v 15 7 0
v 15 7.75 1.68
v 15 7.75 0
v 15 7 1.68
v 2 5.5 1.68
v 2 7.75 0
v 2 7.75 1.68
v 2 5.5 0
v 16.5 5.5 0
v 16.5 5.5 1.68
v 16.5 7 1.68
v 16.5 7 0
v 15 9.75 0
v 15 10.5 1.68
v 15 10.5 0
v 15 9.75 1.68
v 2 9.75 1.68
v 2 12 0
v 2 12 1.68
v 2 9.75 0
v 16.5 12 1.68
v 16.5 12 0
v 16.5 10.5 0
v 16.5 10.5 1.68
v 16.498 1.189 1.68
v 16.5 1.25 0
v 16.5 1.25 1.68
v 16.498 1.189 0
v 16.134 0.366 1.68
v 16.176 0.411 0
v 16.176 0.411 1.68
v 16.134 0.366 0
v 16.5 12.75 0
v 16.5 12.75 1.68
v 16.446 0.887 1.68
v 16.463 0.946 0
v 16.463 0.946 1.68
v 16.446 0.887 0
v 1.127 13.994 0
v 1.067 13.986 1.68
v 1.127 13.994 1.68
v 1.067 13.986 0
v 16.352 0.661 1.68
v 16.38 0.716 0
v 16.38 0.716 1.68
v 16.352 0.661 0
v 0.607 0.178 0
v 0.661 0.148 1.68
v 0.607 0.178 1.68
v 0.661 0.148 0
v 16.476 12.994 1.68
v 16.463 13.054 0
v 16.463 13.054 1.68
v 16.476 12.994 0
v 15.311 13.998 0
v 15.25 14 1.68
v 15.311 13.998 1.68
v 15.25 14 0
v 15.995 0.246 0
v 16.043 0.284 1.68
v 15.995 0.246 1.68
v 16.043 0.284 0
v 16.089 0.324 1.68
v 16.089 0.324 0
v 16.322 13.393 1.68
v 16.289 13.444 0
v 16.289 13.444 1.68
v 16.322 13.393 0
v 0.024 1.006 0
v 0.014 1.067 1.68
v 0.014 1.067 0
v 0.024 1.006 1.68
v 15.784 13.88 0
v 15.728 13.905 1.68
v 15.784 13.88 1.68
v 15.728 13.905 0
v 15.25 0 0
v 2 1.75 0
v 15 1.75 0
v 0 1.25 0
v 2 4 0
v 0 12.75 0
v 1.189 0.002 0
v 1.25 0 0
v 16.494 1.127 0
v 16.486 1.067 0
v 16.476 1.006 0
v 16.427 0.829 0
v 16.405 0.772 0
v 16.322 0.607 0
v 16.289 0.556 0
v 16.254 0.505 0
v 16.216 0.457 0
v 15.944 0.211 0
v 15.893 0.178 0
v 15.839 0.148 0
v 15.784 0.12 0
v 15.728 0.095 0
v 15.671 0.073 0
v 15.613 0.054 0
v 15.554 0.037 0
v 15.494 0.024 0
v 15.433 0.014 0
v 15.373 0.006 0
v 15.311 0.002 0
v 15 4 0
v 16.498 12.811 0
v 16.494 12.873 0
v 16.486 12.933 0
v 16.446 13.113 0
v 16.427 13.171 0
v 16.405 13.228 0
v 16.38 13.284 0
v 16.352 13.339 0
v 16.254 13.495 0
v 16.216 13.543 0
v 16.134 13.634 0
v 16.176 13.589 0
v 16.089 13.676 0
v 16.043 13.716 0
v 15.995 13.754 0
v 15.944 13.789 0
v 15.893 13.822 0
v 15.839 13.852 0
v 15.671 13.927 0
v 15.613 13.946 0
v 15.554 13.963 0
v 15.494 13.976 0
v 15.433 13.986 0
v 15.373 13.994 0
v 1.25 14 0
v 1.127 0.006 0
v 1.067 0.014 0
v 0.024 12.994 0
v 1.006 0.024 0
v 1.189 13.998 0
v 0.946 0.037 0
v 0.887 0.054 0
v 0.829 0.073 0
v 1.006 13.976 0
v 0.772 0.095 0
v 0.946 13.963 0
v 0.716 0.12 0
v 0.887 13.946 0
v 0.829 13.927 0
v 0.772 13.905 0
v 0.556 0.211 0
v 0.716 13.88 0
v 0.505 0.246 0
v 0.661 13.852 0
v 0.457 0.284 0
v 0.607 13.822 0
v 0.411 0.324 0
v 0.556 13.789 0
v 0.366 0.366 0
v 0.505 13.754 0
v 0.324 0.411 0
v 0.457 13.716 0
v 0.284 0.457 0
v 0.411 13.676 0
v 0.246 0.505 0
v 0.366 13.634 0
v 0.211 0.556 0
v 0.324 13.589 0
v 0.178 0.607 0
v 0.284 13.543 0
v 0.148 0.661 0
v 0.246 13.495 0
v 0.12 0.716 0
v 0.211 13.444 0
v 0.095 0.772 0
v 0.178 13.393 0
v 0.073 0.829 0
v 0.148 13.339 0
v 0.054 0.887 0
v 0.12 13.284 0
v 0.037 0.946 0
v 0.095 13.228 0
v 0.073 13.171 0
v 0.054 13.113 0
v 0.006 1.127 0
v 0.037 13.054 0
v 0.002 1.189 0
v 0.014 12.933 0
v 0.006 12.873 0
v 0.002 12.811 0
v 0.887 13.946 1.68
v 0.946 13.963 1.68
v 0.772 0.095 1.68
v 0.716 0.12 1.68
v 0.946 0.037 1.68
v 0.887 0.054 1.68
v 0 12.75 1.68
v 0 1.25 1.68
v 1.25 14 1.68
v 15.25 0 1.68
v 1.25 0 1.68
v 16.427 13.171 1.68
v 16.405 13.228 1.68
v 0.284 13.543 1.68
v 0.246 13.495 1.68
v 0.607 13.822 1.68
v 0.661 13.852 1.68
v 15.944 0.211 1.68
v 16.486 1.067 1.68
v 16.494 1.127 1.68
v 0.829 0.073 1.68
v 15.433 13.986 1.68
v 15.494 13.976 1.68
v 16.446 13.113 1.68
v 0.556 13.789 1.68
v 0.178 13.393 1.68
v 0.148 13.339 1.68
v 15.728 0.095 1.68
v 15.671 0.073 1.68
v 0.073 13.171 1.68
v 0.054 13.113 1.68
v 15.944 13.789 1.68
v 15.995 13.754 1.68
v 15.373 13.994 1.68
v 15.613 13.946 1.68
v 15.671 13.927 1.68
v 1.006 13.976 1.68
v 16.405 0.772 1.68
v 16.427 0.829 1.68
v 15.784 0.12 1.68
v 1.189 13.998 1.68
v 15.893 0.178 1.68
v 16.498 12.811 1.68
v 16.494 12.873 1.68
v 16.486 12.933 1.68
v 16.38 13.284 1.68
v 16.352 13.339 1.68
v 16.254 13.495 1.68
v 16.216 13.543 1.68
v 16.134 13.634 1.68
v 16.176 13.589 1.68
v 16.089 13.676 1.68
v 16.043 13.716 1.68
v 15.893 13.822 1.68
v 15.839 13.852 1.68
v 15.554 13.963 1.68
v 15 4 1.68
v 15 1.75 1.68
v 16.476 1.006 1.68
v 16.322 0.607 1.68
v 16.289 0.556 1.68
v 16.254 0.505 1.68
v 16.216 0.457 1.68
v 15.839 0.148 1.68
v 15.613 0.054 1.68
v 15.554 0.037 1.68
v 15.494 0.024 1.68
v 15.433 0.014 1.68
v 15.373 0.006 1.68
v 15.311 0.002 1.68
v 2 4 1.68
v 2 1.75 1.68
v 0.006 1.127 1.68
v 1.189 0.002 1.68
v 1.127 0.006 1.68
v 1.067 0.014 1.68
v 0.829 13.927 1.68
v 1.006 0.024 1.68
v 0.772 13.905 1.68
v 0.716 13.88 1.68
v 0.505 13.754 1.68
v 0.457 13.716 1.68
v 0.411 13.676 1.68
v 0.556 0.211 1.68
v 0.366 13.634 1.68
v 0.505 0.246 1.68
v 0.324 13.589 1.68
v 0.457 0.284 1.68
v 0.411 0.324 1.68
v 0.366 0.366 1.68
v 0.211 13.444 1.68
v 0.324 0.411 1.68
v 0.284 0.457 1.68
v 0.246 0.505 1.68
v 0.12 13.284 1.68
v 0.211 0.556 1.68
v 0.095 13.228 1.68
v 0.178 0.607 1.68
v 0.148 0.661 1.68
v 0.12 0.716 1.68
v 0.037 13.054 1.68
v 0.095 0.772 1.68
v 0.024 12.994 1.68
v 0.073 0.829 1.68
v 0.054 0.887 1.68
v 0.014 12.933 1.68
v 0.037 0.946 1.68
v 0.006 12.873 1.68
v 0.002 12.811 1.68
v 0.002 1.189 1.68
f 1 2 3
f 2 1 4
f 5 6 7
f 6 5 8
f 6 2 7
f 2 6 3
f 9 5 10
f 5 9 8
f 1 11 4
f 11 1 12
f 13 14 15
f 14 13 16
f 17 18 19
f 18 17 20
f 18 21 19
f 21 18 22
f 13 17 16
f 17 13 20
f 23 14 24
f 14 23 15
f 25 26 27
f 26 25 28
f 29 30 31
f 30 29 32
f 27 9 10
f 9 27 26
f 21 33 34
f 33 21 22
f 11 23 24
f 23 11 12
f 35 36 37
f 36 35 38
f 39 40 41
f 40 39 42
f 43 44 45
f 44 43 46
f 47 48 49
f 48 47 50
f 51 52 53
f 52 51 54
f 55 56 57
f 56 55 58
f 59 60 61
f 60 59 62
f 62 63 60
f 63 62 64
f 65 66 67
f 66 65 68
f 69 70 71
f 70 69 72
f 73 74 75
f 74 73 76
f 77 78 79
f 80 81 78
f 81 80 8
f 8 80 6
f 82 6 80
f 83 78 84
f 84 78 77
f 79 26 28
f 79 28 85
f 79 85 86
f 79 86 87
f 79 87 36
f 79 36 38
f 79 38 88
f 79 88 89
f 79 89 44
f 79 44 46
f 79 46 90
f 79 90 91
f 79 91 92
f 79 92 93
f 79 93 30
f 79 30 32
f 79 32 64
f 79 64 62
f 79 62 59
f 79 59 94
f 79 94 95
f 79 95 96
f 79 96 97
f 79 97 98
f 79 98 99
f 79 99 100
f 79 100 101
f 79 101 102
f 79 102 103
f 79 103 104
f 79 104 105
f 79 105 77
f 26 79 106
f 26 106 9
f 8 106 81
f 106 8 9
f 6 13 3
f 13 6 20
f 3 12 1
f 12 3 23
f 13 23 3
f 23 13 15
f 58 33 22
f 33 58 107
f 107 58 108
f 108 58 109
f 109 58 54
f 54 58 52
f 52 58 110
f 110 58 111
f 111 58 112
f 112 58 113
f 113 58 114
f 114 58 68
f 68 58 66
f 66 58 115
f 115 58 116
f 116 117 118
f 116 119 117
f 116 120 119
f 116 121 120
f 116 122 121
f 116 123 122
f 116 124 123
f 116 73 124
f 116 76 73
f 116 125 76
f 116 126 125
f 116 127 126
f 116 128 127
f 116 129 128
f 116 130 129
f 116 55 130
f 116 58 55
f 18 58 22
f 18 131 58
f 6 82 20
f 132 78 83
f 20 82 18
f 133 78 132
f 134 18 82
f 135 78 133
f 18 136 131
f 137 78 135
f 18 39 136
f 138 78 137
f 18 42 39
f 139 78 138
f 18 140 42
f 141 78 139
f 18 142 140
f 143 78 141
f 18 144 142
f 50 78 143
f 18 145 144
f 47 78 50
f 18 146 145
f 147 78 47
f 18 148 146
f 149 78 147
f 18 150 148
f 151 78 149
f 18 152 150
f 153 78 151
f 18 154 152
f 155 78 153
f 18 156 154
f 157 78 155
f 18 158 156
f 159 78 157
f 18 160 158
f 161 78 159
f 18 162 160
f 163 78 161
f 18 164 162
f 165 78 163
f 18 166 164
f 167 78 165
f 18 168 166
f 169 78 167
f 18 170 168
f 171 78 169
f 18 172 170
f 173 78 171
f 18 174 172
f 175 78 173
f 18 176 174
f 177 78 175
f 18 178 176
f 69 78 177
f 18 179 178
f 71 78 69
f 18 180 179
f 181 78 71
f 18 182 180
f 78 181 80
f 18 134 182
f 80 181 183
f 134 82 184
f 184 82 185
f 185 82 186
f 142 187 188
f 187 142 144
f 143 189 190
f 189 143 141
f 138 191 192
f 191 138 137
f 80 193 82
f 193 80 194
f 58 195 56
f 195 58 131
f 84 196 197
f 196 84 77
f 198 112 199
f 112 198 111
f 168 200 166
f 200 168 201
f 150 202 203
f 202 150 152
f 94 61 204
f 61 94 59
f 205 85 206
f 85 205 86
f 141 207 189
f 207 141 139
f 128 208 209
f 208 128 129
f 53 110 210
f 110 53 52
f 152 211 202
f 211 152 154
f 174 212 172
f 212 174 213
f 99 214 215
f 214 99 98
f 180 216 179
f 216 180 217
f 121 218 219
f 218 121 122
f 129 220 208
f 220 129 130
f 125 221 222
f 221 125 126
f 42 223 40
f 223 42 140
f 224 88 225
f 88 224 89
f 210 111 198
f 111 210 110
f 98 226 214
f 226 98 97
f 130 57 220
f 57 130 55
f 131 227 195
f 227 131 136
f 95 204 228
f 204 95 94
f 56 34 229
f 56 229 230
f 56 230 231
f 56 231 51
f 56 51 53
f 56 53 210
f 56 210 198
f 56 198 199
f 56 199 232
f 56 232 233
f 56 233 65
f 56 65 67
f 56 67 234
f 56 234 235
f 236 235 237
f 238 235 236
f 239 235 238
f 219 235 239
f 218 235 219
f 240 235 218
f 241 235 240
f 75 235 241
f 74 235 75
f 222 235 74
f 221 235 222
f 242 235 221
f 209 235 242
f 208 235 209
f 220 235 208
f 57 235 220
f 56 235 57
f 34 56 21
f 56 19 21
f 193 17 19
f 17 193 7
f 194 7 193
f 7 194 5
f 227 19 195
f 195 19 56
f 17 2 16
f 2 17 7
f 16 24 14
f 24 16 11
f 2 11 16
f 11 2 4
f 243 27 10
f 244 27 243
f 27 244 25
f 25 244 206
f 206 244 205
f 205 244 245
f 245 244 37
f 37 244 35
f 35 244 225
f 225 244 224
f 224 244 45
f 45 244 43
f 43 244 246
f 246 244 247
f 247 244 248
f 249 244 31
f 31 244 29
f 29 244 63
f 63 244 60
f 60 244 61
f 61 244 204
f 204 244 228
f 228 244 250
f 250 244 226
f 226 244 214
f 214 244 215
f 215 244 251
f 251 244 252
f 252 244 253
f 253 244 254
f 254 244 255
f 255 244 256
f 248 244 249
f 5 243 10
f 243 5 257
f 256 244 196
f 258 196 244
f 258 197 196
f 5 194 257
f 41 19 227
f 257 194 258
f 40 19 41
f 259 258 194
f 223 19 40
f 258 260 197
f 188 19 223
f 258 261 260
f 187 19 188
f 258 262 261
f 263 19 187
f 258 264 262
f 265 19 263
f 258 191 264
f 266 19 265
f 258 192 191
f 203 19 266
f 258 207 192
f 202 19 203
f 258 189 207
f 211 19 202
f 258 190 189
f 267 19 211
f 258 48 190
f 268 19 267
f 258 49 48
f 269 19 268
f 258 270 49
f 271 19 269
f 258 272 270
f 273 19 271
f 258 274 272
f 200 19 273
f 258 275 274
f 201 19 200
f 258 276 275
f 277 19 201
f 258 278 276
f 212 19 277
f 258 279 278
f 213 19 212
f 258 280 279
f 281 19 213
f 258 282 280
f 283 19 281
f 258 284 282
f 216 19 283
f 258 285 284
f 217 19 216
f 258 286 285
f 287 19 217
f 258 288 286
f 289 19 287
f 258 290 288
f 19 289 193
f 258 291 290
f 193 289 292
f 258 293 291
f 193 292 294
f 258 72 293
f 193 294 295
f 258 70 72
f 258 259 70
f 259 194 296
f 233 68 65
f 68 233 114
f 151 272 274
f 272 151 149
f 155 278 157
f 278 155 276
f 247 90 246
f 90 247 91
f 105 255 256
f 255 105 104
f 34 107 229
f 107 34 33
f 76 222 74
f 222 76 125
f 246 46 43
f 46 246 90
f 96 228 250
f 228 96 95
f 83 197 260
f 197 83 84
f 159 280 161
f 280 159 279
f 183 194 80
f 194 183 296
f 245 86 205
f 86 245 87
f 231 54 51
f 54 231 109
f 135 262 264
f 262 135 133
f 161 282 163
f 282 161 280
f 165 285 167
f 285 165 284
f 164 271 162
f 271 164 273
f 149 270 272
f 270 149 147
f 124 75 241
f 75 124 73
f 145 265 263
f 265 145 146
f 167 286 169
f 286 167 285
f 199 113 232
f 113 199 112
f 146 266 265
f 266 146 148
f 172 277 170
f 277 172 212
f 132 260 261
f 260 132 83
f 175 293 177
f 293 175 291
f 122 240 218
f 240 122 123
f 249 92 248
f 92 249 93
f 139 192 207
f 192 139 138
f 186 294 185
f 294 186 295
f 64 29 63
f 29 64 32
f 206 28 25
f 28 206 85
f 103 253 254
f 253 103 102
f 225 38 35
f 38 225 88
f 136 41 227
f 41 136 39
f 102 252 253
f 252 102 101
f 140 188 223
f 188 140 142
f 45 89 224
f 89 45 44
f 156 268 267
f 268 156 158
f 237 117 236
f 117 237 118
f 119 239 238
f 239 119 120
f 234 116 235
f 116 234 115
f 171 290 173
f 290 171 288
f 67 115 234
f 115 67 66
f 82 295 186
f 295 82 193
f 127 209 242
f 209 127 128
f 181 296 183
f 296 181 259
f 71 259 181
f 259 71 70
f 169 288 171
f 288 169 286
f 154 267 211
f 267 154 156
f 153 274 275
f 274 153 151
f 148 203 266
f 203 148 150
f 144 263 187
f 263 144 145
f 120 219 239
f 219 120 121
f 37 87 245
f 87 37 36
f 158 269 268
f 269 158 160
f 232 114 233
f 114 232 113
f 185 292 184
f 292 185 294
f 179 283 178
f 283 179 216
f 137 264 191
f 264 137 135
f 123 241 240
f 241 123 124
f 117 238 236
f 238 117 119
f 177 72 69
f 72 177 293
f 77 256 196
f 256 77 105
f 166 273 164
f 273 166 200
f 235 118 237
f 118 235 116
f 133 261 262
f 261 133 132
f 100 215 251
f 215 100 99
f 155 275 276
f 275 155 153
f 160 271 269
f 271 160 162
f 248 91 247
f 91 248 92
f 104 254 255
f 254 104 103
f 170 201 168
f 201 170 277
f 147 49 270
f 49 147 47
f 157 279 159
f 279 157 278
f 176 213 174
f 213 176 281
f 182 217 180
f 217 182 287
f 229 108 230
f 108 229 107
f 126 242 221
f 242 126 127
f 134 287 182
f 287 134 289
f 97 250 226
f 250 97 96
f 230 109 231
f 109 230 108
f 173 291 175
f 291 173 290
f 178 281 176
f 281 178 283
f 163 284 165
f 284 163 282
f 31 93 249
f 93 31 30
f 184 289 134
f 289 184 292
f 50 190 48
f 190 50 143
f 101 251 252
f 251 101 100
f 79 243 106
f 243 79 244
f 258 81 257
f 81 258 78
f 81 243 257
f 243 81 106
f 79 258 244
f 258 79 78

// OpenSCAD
$fn=128;


t=1.68;

difference() {
  translate([1.25,1.25,0]) base();
  translate([2,1.75,-0.5]) cube([13,2.25,t+1]);
  translate([2,5.5,-0.5]) union() { 
    cube([13,2.25,t+1]);
    cube([18,1.5,t+1]);
  }

  translate([2,9.75,-0.5]) union() { 
    cube([13,2.25,t+1]);
    translate([0,0.75,0]) cube([18,1.5,t+1]);
  }
}

module base() {
  l=16.5;
  w=14;
  r=1.25;
  hull() {
    cylinder(r=r,h=t);
    translate([l-r*2,0,0]) cylinder(r=r,h=t);
    translate([0,w-r*2,0]) cylinder(r=r,h=t);
    translate([l-r*2,w-r*2,0]) cylinder(r=r,h=t);
  }
}
